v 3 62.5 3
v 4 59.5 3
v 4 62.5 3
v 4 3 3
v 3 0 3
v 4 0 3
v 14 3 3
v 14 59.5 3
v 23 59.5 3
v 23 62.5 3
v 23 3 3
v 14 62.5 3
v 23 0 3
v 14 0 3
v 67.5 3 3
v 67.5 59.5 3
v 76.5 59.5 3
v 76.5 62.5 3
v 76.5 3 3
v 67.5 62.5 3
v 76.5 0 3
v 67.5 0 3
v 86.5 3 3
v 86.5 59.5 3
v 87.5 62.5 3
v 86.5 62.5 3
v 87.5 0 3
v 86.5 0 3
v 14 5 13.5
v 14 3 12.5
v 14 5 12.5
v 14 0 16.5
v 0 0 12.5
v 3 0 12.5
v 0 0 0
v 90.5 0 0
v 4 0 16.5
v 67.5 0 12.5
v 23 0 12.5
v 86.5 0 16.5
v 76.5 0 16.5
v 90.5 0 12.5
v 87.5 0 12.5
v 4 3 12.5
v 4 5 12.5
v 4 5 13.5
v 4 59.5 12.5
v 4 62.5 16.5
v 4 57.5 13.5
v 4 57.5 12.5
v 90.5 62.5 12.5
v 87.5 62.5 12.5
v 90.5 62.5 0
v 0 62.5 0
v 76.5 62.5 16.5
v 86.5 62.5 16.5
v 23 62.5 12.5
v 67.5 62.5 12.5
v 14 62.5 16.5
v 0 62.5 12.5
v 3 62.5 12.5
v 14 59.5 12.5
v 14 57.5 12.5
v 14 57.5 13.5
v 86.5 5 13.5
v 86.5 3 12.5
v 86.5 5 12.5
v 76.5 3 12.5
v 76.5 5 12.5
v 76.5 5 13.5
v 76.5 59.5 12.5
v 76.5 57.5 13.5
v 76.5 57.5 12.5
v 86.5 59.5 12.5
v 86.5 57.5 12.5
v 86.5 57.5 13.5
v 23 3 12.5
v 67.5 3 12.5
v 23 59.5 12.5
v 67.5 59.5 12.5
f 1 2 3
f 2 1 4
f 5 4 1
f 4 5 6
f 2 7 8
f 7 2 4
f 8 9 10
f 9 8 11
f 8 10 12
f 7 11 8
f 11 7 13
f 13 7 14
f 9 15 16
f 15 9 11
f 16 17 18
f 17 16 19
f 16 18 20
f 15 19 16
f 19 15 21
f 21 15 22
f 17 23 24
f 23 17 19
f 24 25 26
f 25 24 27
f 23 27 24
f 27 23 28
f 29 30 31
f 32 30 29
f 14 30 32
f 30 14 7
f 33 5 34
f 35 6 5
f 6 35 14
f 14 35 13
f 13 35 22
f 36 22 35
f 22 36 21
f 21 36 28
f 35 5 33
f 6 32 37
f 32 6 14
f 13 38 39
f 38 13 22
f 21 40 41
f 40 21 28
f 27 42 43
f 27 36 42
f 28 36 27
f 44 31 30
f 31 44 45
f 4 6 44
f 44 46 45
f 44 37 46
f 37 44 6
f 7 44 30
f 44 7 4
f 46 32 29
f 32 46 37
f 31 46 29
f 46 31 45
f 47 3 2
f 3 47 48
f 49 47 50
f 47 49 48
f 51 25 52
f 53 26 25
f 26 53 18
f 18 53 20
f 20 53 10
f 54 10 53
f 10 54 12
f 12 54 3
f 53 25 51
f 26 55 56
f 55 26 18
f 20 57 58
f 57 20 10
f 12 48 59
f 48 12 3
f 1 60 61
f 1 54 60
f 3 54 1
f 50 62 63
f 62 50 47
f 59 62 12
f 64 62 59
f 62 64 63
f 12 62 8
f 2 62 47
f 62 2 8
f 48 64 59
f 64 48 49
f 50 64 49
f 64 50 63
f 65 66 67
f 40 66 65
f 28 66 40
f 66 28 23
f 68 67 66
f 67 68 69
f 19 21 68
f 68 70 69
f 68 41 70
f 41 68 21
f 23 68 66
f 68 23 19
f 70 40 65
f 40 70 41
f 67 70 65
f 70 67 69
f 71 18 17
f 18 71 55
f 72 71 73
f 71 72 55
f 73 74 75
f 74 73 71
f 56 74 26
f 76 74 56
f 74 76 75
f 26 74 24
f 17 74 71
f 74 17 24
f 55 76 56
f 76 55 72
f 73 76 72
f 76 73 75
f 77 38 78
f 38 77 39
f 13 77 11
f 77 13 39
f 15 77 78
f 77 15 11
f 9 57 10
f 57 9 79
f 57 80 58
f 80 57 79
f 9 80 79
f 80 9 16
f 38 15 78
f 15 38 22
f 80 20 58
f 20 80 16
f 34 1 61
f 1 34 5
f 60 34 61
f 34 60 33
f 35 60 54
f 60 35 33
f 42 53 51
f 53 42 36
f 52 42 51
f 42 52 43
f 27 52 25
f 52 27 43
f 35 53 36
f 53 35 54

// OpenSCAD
//breadboard_measurment
bb_x=84.5;
bb_y=56.5;
bb_z=9.5;

//walls
w_fl = 3; //floor
w_si = 3; //side walls


//triangle over the board used to keep it in place
// w is the with of the triangle (perpendicular to the folliwing drawing)
//  |\
//h1|  \
//  |   \
//  |___a|h2
//    x
t_h1  = 4;
t_h2  = 1;
t_x   = 5;
t_w   = 5;

//walls and clip along the X axis must be defined manually, see the section : X_STUFF
//  bb_clip4(x1,x2) will create 4 clips according the the x coordinates of the bottom left one (lowest x values). Don't forget to add space around clips
//  bb_wall4(x1,x2) will create 4 walls according the the x coordinates of the bottom left one (lowest x values)

//=== CLIPS ====
module triangle_clip(h1,h2,x,w){
  translate([0,0,0])
  rotate([90,0,90])
  linear_extrude(w){
     polygon(
       points=[ [0,0] , [x,0] , [x,h2], [0,h1]  ]
     );
  }  
}

module bb_clip(x1,x2){

   translate([0,0,0]){
   union() {
   //wall
   linear_extrude(bb_z){
      polygon([ [x1,0] , [x2,0] , [x2 , w_si] , [x1, w_si] ]);
   }
   
   //triangle
   translate([x1,0,bb_z]){
     triangle_clip (t_h1,t_h2,t_x,x2-x1);
   }
   }}
}

module bb_clip2(x1,x2){
    union() {
    bb_clip(x1,x2);
    
    translate([x2,bb_y + 2*w_si ,0]){
        rotate([0,0,180]){
                bb_clip(0,x2-x1);
        }
    }
    }
}

module bb_clip4(x1,x2){
    union() {
    bb_clip2(x1,x2);
    bb_clip2(bb_x+2*w_si-x2, bb_x+2*w_si-x1 );
    }
}


//=== X_WALLS ====
module bb_wall(x1,x2){
   linear_extrude(bb_z){
      polygon([ [x1,0] , [x2,0] , [x2 , w_si] , [x1, w_si] ]);
   }
}

module bb_wall2(x1,x2){
   union() {    
   bb_wall(x1,x2);
    
    translate([x2,bb_y + 2*w_si ,0]){
        rotate([0,0,180]){
                bb_wall(0,x2-x1);
        }
    } 
   }
}




module bb_wall4(x1,x2){
    union() {
    bb_wall2(x1,x2);
    bb_wall2(bb_x+2*w_si-x2, bb_x+2*w_si-x1 );
    }
}





//level 0 : floor
linear_extrude(w_fl){
     polygon(
       points=[ [0,0] , [bb_x+2*w_si ,0] , [bb_x+2*w_si ,bb_y+2*w_si], [0,bb_y+2*w_si]  ]
     );
} 

//level 1 
translate([0,0,w_fl]){

    //solid wall left
    linear_extrude(bb_z){
      polygon([ [0,0] , [w_si,0] , [w_si ,bb_y+2*w_si] , [0,bb_y+2*w_si] ]);
    }
    
    //solid wall right
    linear_extrude(bb_z){
      polygon([ [bb_x+w_si,0] , [bb_x+2*w_si,0] , [bb_x + 2*w_si ,bb_y+2*w_si] , [bb_x+w_si,bb_y+2*w_si] ]);
    }
   
    //--- X_STUFF ---
    //define what's along the X axis
    
    //clip (don't forget to add holes around)
    bb_clip4(w_si+1 , w_si+1 +10 ); 
    
    //x_wall
    bb_wall4(w_si + 20, w_si + 50 ); 
    
}
